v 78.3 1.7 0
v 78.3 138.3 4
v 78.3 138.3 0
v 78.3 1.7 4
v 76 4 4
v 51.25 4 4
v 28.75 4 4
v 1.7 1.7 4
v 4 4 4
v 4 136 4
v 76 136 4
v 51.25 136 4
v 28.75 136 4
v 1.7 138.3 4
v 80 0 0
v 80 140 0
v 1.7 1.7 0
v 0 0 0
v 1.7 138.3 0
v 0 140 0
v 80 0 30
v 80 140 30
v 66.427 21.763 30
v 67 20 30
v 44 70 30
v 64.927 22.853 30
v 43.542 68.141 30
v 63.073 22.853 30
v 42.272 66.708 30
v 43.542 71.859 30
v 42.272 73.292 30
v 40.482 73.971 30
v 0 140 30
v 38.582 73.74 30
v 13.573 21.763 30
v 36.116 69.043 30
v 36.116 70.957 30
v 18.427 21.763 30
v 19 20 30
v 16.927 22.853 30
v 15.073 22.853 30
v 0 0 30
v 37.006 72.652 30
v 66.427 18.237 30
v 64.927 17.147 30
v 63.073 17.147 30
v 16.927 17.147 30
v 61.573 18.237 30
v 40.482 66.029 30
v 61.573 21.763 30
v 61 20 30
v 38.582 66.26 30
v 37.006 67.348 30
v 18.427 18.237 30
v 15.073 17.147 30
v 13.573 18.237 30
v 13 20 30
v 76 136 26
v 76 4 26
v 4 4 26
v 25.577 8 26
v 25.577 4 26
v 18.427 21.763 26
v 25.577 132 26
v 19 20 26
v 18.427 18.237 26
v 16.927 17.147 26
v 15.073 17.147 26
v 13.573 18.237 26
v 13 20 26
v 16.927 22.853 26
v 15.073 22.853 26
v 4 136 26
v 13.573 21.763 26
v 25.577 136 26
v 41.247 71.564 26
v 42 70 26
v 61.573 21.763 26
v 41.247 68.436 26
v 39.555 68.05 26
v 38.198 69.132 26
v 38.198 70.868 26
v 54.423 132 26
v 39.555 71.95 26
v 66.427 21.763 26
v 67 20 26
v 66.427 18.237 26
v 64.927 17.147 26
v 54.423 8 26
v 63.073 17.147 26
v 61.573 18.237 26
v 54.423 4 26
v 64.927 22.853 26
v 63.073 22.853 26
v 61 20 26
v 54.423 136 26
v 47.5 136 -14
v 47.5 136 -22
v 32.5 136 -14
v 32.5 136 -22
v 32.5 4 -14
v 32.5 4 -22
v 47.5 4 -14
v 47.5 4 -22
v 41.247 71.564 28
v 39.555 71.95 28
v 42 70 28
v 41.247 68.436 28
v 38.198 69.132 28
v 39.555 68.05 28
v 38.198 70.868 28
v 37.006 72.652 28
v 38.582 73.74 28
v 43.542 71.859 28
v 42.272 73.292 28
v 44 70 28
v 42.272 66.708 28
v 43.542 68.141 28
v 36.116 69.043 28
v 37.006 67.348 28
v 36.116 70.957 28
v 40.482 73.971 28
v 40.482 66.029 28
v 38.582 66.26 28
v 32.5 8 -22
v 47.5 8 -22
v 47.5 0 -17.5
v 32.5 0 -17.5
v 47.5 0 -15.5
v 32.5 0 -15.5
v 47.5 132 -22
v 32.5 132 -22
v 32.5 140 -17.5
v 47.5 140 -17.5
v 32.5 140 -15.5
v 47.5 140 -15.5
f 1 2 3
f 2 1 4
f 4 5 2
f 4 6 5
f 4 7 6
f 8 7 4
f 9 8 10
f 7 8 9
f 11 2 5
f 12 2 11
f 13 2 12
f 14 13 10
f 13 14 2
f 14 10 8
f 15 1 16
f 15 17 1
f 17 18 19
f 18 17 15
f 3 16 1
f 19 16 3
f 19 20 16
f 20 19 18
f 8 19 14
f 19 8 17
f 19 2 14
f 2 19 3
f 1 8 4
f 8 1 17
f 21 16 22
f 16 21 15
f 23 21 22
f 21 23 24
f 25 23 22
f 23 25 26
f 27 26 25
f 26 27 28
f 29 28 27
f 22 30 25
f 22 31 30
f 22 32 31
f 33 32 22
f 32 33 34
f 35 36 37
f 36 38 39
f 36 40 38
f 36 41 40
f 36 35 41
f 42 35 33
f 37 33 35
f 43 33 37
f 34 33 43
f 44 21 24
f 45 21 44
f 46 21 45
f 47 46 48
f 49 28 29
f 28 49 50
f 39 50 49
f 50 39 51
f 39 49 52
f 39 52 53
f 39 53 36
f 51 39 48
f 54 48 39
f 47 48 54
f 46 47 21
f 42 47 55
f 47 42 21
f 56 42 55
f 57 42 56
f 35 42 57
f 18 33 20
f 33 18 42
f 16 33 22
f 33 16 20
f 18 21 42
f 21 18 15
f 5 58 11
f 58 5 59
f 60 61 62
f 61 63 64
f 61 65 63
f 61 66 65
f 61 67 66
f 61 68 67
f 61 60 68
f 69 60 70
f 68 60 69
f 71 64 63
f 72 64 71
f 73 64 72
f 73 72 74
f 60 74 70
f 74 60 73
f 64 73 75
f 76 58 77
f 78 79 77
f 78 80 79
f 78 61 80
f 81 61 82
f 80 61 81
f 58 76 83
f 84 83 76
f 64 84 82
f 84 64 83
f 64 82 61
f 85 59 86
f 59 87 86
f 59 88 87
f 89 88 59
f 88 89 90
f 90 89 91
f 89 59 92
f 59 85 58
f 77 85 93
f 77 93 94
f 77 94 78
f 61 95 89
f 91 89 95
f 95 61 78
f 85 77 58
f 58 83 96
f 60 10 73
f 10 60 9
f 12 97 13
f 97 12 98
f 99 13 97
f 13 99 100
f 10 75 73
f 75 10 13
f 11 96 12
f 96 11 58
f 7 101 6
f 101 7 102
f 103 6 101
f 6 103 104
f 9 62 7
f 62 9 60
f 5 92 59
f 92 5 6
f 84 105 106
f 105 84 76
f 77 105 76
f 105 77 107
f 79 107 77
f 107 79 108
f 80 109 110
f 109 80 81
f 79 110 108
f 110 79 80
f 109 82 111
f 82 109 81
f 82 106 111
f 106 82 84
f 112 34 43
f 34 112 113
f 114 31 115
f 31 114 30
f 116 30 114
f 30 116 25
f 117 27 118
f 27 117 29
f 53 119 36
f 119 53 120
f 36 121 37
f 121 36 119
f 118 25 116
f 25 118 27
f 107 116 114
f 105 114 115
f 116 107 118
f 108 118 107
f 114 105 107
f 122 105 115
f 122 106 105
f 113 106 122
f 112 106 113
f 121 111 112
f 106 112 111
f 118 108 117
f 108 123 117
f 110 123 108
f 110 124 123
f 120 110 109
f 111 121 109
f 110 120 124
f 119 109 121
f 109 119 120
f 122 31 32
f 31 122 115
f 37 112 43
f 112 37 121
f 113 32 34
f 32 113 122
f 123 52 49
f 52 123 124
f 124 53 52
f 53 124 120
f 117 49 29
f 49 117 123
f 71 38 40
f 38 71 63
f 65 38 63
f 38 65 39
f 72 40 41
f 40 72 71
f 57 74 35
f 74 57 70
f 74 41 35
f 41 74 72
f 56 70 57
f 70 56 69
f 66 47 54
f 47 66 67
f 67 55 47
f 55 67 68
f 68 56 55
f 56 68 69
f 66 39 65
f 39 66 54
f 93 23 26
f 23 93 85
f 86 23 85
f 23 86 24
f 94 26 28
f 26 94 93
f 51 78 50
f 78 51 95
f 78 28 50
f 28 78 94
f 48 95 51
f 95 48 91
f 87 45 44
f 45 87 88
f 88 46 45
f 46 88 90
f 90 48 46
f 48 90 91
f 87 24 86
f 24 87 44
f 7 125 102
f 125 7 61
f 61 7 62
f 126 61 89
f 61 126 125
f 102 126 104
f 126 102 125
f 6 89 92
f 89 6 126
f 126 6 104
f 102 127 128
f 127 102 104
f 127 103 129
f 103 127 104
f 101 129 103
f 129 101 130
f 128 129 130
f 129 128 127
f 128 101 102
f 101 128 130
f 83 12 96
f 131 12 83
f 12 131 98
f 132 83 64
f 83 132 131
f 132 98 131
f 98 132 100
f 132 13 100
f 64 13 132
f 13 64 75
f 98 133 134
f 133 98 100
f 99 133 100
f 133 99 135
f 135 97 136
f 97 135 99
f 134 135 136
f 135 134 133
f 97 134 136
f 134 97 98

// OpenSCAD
clear = 0.4;
ac_top_l = 3/4*25.4 + clear;
ac_h = (1+3/32)*25.4 + clear;
ac_t1 = 0.2*25.4;
ac_t2 = 19.8;
ac_depth = ac_t1 + ac_t2;
ac_offset_y = (1+.5+1/32)*25.4;
ac_t_ext = 0*5;
radius = 17 + clear;

module ac_socket_single() {
    t = ac_t1 + ac_t2 + ac_t_ext;
    translate([0, 0, -ac_t_ext])
        cube([ac_top_l, ac_h, t]);
    translate([ac_top_l/2, ac_h/2, -ac_t_ext])
        render() intersection() {
            cylinder(r = radius, h = t);
            cube([ac_top_l*10, ac_h, t*2], center = true);
        }
}

module slot(r, l, h) {
    difference() {
        union() {
            translate([-l/2, -r]) cube([l, r*2, h]);
            translate([l/2, 0]) cylinder(r = r, h = h);
            translate([-l/2, 0]) cylinder(r = r, h = h);
        }
    }
}

module ac_socket(screws=true) {
    ac_socket_single();
    to_center_y = ac_offset_y-(ac_offset_y-ac_h)/2;
    difference() {
        translate([ac_top_l/2-15, -1.5, 0])
            cube([30, 47, ac_t2]);
        if (screws) {
            translate([ac_top_l/2, to_center_y, 0]) {
                translate([0, 0, ac_t2/2])
                    #cylinder(r=2, h=ac_t2/2);
                translate([0, 0, ac_t2-1])
                    #cylinder(r=3, h=1);
            }
        }
    }
    difference() {
        translate([ac_top_l/2-17, -20.5, ac_t2])
            cube([34, 20.5, 0.5]);
        if (screws) {
            translate([ac_top_l/2, to_center_y-42, ac_t2-0.01])
                #slot(r=2, l=6, h=1);
            translate([ac_top_l/2-11, to_center_y-46.2, ac_t2])
                #cylinder(r=2.5, h=1);
            translate([ac_top_l/2+11, to_center_y-46.2, ac_t2])
                #cylinder(r=2.5, h=1);
        }
    }
    difference() {
        translate([ac_top_l/2-17, 2*to_center_y, ac_t2])
            cube([34, 20.5, 0.5]);
        if (screws) {
            translate([ac_top_l/2, to_center_y+42, ac_t2-0.01])
                #slot(r=2, l=6, h=1);
            translate([ac_top_l/2-11, to_center_y+46.2, ac_t2])
                #cylinder(r=2.5, h=1);
            translate([ac_top_l/2+11, to_center_y+46.2, ac_t2])
                #cylinder(r=2.5, h=1);
        }
    }
    translate([0, ac_offset_y, 0])
        ac_socket_single();
    translate([ac_top_l/2, to_center_y, 0]) {
        //cylinder(r=3, h=ac_t1);
        translate([0, 0, ac_t1])
            cylinder(r=2, h=ac_t_ext);
        *translate([0, 40, 0]) {
            slot(r=2.5, l=7, h=ac_t1);
            translate([0, 0, ac_t1])
                cylinder(r=2, h=ac_t_ext);
        }
        *translate([0, -40, 0]) {
            slot(r=2.5, l=7, h=ac_t1);
            translate([0, 0, ac_t1])
                cylinder(r=2, h=ac_t_ext);
        }
    }
}

module trapezoid(width1, width2, height, thickness, shape=0) {
    diff_w = width1 - width2;
    linear_extrude(thickness) polygon([[0, 0], [(1+shape)* diff_w/2, height],
                                       [(1+shape)* diff_w/2 + width2, height], [width1, 0]]);
}

wall_t = 4;
case_w = 80;
case_h = 140;
latch_w = 20;
latch_w1 = 30;
latch_w2 = 15;
latch_h = 8;
latch_y = 8;
latch_t = 4;
latch_reach = 52;

module latch() {
    knib_h = latch_h;
    knib_l = wall_t;
    knib_end_h = 2;
    t = wall_t;
    rotate([-90, 0, 0])
        trapezoid(latch_w1, latch_w2, latch_reach, t);
    translate([latch_w1-latch_w2/2, 0, -latch_reach+knib_h])
    rotate([0, 90, 180])
        trapezoid(knib_h, knib_end_h, knib_l, latch_w2, -0.5);
}

module case_top() {
    case_t = 30;
    clear = 0.3;
    render() difference() {
        render() difference() {
            cube([case_w, case_h, case_t]);
            translate([wall_t, wall_t, 0])
                cube([case_w-2*wall_t, case_h-2*wall_t, case_t-wall_t]);
            translate([wall_t/2-clear, wall_t/2-clear, 0])
                    difference() {
                        cube([case_w-wall_t+clear*2, case_h-wall_t+clear*2, wall_t]);
                        translate([wall_t/2+clear*2, wall_t/2+clear*2, 0])
                            cube([case_w-wall_t*2-clear*2, case_h-wall_t*2-clear*2, wall_t]);
                    }
        }
        translate([case_w/2-ac_top_l/2, case_h/2-ac_h/2-ac_offset_y/2, case_t - ac_depth + 0.001])
            %ac_socket(false);
        translate([case_w/2, case_h/2, case_t-wall_t])
            cylinder(r=2, h=wall_t);
        translate([case_w/2, case_h/2, case_t-wall_t/2])
            cylinder(r=4, h=wall_t/2);
        translate([case_w/2-24, 20, case_t-wall_t])
            cylinder(r=3, h=wall_t);
        translate([case_w/2+24, 20, case_t-wall_t])
            cylinder(r=3, h=wall_t);
    }
    translate([case_w/2-latch_w1/2, latch_t, case_t])
            latch();
    translate([case_w/2+latch_w1/2, case_h-latch_t, case_t])
        rotate([0, 0, 180])
        latch();
}

spacer_t = 14;
module screw_spacer(spacer_r=6.5) {
    hole_h = 8;
    render() difference() {
        cylinder(r=spacer_r, h=spacer_t);
        translate([0, 0, spacer_t-hole_h])
            cylinder(r=2, h=hole_h);
    }
}

module case_bottom() {
    case_t = 34;
    clear = 0.6;
    in_wall_t = 2.4;
    difference() {
        union() {
            render() difference() {
                    cube([case_w, case_h, case_t]);
                translate([wall_t, wall_t, wall_t])
                    cube([case_w-2*wall_t, case_h-2*wall_t, case_t]);
                translate([case_w/2-latch_w/2, 0, latch_y])
                    cube([latch_w, wall_t, latch_h]);
                translate([case_w/2-latch_w/2, case_h-wall_t, latch_y])
                    cube([latch_w, wall_t, latch_h]);
                translate([0, 0, case_t-wall_t])
                    difference() {
                        cube([case_w, case_h, wall_t]);
                        translate([wall_t/2, wall_t/2, 0])
                            cube([case_w-wall_t, case_h-wall_t, wall_t]);
                    }
                translate([10-clear, 108-clear, 0])
                    cube([58.5+clear*2, 17+clear*2, 20]);
            }
            translate([13.4, 3.6 + case_h/2 - 84.455/2 - 12, 0]) {
                translate([0, 0, 0])
                    screw_spacer();
                translate([53.34, 0, 0])
                    screw_spacer();
                translate([0, 76.835+1, 0])
                    screw_spacer(4.5);
                translate([53.34, 76.835, 0])
                    screw_spacer(5.5);
            }
            render() translate([10, 108, 0]) difference() {
                translate([-in_wall_t-clear, -in_wall_t-clear, 0])
                    cube([58.5+in_wall_t*2+clear*2, 17+in_wall_t*2+clear*2, 20+in_wall_t+clear]);
                translate([-clear, -clear, 0])
                    cube([58.5+clear*2, 17+clear*2, 20]);
                translate([12, 17/2, 20])
                    cylinder(r=2, h=in_wall_t+clear);
                translate([12+34.5, 17/2, 20])
                    cylinder(r=2, h=in_wall_t+clear);
                translate([1.6, 17/2, 20])
                    cylinder(r=1.25, h=in_wall_t+clear);
                translate([1.6+55.3, 17/2, 20])
                    cylinder(r=1.25, h=in_wall_t+clear);
                translate([56.2, 0.5, 20])
                    cylinder(r=1.25, h=in_wall_t+clear);
            }
        }
    }
}

//ac_socket();
case_top();

*translate([0, 0, -30-0]) {
    case_bottom();

    translate([10, case_h/2 - 84.455/2 - 12, 1+spacer_t])
    rotate([0, 0, 90]) {
        translate([-101, 83, 0])
            %import("circuit.stl");
        translate([25.8, -41, 1])
            #cube([12.7, 29, 15.7]);
        translate([9.4, -41, 1])
            #cube([12.7, 29, 15.7]);
        translate([45.5, -56.6, -9])
            #cube([17, 43, 9]);
    }
    *translate([10, 108, 0])
            #cube([58.5, 17, 20]);
}
